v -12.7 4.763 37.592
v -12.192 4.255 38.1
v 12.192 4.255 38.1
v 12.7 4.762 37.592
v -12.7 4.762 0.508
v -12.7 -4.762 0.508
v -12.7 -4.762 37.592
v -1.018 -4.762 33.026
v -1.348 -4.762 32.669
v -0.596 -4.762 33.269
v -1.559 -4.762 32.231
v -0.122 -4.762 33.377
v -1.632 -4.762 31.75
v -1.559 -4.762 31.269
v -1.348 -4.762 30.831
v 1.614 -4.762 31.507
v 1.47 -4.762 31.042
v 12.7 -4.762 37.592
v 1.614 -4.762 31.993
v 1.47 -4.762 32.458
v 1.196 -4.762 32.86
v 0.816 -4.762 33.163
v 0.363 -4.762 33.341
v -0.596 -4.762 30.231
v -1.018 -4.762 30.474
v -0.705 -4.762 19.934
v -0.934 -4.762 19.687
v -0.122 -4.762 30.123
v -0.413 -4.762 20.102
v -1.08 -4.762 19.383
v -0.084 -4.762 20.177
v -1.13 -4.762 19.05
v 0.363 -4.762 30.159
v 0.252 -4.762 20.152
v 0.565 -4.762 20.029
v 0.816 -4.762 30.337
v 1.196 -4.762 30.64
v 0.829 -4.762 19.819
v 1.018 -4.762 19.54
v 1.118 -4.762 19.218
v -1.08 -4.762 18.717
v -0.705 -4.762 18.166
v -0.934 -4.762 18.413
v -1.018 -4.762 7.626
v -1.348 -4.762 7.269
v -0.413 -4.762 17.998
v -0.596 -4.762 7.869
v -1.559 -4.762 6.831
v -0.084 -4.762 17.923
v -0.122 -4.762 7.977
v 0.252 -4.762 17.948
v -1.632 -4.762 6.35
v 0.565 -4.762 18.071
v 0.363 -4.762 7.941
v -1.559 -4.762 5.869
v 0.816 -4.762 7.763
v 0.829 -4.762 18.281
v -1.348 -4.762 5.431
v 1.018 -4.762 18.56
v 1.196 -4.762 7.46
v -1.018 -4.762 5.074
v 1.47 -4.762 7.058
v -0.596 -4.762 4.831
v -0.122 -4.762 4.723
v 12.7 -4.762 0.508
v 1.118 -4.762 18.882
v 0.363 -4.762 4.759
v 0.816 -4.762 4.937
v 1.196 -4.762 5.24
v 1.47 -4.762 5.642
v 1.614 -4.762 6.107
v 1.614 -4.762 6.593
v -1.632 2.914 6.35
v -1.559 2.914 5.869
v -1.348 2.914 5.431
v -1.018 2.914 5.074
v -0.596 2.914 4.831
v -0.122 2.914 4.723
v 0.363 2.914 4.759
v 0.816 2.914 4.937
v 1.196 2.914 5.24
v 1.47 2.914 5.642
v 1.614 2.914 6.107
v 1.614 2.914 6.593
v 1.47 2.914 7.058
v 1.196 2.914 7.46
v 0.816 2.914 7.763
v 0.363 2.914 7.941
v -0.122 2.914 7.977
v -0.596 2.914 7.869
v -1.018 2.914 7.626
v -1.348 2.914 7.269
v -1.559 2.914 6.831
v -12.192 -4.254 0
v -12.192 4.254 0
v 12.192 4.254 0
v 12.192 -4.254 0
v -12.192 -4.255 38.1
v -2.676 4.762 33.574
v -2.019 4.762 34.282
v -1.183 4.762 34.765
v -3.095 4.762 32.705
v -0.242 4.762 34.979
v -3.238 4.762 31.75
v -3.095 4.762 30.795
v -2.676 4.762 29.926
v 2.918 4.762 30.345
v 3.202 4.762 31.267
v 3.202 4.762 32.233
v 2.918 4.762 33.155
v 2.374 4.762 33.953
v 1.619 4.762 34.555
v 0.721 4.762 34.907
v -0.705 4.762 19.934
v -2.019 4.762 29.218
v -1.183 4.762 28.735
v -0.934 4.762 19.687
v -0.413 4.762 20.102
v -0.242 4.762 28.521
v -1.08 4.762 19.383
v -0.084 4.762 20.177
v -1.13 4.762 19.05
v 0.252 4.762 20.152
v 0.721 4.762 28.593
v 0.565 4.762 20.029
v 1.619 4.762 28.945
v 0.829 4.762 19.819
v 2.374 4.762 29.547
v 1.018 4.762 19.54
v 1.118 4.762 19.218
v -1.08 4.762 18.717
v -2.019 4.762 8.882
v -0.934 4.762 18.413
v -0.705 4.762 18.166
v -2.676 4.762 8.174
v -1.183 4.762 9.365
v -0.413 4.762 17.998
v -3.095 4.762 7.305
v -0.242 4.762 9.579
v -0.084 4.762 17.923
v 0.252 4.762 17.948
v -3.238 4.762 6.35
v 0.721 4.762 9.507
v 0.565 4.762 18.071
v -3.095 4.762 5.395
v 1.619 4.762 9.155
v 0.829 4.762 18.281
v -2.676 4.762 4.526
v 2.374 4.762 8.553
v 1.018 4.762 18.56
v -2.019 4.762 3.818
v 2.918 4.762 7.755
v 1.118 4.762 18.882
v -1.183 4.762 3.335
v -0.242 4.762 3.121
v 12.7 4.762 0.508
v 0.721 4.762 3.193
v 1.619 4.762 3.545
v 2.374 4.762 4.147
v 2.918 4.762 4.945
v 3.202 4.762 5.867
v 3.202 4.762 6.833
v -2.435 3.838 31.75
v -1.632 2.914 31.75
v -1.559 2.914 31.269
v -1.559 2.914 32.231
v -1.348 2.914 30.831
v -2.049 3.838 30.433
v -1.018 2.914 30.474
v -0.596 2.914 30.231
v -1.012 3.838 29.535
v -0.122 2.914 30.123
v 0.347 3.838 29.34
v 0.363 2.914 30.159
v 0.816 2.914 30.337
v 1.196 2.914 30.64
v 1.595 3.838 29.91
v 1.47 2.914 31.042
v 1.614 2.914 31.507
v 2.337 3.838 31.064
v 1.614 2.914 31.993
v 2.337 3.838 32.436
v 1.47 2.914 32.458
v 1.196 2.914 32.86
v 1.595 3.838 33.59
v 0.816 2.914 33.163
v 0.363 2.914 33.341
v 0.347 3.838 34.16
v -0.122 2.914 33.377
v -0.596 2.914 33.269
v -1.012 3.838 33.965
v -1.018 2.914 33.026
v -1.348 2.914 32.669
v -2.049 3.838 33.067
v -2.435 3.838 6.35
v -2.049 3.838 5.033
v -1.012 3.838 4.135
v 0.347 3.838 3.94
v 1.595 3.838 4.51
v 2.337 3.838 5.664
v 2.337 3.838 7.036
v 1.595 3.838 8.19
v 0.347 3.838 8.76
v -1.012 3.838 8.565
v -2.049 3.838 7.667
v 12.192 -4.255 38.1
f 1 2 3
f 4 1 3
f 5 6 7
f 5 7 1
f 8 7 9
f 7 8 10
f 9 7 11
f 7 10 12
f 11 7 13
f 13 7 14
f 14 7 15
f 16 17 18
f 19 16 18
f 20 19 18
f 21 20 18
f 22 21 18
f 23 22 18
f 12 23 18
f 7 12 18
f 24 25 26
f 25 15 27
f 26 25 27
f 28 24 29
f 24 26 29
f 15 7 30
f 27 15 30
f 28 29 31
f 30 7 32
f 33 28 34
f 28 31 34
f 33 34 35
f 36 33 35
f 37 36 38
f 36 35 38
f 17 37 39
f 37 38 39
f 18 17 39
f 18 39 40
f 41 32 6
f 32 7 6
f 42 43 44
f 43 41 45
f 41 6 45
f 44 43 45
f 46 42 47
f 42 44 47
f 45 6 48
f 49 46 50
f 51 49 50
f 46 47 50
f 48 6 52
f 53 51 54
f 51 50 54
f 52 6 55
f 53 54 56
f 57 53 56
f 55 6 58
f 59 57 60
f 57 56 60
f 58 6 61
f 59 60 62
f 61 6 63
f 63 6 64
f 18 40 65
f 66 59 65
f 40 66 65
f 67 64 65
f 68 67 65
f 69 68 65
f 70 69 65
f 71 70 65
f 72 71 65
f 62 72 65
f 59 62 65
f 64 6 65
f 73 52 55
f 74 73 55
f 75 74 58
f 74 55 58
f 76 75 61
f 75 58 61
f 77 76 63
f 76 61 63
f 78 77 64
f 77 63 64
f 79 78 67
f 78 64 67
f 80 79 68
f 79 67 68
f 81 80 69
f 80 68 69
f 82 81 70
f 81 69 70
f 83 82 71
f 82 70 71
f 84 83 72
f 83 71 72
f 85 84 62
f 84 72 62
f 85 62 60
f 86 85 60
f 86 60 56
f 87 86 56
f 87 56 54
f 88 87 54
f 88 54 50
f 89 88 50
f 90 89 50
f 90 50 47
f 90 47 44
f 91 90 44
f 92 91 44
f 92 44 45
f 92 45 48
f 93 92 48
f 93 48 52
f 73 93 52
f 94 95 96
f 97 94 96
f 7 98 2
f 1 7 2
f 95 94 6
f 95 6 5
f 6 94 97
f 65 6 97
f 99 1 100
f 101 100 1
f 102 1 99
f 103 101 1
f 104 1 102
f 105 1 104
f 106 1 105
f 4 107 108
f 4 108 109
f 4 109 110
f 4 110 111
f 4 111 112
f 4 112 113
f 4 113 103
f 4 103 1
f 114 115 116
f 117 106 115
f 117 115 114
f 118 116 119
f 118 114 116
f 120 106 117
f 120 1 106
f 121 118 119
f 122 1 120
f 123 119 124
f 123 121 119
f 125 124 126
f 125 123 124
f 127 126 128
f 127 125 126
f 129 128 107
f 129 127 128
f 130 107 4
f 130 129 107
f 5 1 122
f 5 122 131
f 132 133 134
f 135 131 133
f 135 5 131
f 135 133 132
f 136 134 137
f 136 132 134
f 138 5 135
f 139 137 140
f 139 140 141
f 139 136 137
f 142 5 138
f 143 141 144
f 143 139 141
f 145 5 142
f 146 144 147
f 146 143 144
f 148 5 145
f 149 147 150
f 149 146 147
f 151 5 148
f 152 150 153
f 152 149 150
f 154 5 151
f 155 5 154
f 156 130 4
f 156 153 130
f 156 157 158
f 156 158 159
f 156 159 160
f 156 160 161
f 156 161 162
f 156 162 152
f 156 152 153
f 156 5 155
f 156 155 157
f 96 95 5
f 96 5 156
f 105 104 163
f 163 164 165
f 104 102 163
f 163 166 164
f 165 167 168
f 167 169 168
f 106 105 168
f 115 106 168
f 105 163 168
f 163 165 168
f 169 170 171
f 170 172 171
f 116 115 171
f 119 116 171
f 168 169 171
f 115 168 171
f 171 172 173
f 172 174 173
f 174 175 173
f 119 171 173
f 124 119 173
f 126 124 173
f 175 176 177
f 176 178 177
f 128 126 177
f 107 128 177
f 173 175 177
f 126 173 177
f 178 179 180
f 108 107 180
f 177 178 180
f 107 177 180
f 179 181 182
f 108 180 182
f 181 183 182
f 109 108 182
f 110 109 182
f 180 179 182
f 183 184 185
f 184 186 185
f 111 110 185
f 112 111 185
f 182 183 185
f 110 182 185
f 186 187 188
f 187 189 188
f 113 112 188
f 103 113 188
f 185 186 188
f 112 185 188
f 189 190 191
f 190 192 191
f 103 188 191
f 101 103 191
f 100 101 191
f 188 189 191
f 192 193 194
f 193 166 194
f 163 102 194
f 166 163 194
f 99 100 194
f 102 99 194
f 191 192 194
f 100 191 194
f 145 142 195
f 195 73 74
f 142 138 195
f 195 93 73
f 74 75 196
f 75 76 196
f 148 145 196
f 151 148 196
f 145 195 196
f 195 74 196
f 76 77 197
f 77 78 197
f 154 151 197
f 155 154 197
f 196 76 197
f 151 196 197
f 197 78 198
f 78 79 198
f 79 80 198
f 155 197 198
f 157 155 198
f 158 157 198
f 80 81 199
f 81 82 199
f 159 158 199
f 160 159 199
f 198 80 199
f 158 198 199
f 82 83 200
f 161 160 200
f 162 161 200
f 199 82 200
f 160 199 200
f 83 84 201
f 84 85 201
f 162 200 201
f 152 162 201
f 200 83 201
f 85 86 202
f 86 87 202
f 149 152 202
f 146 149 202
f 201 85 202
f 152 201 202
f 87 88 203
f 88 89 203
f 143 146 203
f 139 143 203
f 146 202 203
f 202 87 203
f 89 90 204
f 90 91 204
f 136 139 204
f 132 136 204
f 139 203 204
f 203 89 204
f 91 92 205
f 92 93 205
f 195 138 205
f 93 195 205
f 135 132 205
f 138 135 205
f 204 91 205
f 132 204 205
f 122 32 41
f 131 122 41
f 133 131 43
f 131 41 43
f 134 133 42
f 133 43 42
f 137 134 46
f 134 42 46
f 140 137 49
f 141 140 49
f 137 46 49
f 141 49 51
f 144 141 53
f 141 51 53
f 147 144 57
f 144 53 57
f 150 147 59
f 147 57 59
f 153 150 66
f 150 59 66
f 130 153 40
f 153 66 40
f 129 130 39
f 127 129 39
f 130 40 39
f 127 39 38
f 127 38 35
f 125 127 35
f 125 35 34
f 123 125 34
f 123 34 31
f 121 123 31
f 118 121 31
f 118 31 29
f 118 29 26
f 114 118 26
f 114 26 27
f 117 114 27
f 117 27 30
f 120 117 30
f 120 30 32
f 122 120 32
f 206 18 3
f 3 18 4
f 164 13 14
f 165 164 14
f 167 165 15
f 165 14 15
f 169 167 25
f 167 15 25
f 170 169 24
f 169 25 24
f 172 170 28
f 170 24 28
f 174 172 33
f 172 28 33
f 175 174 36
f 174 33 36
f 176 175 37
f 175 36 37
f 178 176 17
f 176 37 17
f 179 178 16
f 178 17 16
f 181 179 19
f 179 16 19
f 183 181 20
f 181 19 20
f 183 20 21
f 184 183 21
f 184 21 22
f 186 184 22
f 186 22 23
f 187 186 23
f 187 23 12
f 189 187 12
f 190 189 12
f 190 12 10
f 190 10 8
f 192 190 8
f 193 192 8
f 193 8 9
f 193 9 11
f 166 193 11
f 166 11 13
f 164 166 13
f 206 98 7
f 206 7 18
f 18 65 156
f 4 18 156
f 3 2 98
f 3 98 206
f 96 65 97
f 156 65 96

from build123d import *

# Parameters (mm, degrees)
SKETCH1_W                                         = 25.4
SKETCH1_H                                         = 9.525
BOSS_EXTRUDE1_DEPTH                               = 38.1
CSK_FOR_4_FLAT_HEAD_SOCKET_CAP_SCREW1_D           = 3.2639
CSK_FOR_4_FLAT_HEAD_SOCKET_CAP_SCREW1_DEPTH       = 9.525
CSK_FOR_4_FLAT_HEAD_SOCKET_CAP_SCREW1_CSINK_D     = 6.477
CSK_FOR_4_FLAT_HEAD_SOCKET_CAP_SCREW1_CSINK_ANGLE = 82
F_4_40_TAPPED_HOLE1_D                             = 2.2606
F_4_40_TAPPED_HOLE1_DEPTH                         = 9.525
CHAMFER1_SIZE                                     = 0.508


with BuildPart() as part:
    # Sketch1 → Boss-Extrude1 (new body)
    with BuildSketch(Plane.XY):
        Rectangle(SKETCH1_W, SKETCH1_H)
    extrude(amount=BOSS_EXTRUDE1_DEPTH)

    # CSK for #4 Flat Head Socket Cap Screw1
    with Locations(Plane(origin=(0, 4.7625, 0), x_dir=(1, 0, 0), z_dir=(0, 1, 0))):
        with Locations((0, -6.35), (0, -31.75)):
            CounterSinkHole(CSK_FOR_4_FLAT_HEAD_SOCKET_CAP_SCREW1_D / 2, CSK_FOR_4_FLAT_HEAD_SOCKET_CAP_SCREW1_CSINK_D / 2, depth=CSK_FOR_4_FLAT_HEAD_SOCKET_CAP_SCREW1_DEPTH, counter_sink_angle=CSK_FOR_4_FLAT_HEAD_SOCKET_CAP_SCREW1_CSINK_ANGLE)

    # #4-40 Tapped Hole1
    with Locations(Plane(origin=(0, 4.7625, 0), x_dir=(1, 0, 0), z_dir=(0, 1, 0))):
        with Locations((0, -19.05)):
            Hole(F_4_40_TAPPED_HOLE1_D / 2, depth=F_4_40_TAPPED_HOLE1_DEPTH)

    # Chamfer1
    chamfer1_edges = [part.edges().sort_by_distance(p)[0] for p in [
        (12.7, 0, 38.1),
        (0, 4.7625, 38.1),
        (-12.7, 0, 38.1),
        (0, 4.7625, 0),
        (12.7, 0, 0),
        (0, -4.7625, 0),
        (-12.7, 0, 0),
        (0, -4.7625, 38.1),
    ]]
    chamfer(chamfer1_edges, length=CHAMFER1_SIZE)


solid = part.part
